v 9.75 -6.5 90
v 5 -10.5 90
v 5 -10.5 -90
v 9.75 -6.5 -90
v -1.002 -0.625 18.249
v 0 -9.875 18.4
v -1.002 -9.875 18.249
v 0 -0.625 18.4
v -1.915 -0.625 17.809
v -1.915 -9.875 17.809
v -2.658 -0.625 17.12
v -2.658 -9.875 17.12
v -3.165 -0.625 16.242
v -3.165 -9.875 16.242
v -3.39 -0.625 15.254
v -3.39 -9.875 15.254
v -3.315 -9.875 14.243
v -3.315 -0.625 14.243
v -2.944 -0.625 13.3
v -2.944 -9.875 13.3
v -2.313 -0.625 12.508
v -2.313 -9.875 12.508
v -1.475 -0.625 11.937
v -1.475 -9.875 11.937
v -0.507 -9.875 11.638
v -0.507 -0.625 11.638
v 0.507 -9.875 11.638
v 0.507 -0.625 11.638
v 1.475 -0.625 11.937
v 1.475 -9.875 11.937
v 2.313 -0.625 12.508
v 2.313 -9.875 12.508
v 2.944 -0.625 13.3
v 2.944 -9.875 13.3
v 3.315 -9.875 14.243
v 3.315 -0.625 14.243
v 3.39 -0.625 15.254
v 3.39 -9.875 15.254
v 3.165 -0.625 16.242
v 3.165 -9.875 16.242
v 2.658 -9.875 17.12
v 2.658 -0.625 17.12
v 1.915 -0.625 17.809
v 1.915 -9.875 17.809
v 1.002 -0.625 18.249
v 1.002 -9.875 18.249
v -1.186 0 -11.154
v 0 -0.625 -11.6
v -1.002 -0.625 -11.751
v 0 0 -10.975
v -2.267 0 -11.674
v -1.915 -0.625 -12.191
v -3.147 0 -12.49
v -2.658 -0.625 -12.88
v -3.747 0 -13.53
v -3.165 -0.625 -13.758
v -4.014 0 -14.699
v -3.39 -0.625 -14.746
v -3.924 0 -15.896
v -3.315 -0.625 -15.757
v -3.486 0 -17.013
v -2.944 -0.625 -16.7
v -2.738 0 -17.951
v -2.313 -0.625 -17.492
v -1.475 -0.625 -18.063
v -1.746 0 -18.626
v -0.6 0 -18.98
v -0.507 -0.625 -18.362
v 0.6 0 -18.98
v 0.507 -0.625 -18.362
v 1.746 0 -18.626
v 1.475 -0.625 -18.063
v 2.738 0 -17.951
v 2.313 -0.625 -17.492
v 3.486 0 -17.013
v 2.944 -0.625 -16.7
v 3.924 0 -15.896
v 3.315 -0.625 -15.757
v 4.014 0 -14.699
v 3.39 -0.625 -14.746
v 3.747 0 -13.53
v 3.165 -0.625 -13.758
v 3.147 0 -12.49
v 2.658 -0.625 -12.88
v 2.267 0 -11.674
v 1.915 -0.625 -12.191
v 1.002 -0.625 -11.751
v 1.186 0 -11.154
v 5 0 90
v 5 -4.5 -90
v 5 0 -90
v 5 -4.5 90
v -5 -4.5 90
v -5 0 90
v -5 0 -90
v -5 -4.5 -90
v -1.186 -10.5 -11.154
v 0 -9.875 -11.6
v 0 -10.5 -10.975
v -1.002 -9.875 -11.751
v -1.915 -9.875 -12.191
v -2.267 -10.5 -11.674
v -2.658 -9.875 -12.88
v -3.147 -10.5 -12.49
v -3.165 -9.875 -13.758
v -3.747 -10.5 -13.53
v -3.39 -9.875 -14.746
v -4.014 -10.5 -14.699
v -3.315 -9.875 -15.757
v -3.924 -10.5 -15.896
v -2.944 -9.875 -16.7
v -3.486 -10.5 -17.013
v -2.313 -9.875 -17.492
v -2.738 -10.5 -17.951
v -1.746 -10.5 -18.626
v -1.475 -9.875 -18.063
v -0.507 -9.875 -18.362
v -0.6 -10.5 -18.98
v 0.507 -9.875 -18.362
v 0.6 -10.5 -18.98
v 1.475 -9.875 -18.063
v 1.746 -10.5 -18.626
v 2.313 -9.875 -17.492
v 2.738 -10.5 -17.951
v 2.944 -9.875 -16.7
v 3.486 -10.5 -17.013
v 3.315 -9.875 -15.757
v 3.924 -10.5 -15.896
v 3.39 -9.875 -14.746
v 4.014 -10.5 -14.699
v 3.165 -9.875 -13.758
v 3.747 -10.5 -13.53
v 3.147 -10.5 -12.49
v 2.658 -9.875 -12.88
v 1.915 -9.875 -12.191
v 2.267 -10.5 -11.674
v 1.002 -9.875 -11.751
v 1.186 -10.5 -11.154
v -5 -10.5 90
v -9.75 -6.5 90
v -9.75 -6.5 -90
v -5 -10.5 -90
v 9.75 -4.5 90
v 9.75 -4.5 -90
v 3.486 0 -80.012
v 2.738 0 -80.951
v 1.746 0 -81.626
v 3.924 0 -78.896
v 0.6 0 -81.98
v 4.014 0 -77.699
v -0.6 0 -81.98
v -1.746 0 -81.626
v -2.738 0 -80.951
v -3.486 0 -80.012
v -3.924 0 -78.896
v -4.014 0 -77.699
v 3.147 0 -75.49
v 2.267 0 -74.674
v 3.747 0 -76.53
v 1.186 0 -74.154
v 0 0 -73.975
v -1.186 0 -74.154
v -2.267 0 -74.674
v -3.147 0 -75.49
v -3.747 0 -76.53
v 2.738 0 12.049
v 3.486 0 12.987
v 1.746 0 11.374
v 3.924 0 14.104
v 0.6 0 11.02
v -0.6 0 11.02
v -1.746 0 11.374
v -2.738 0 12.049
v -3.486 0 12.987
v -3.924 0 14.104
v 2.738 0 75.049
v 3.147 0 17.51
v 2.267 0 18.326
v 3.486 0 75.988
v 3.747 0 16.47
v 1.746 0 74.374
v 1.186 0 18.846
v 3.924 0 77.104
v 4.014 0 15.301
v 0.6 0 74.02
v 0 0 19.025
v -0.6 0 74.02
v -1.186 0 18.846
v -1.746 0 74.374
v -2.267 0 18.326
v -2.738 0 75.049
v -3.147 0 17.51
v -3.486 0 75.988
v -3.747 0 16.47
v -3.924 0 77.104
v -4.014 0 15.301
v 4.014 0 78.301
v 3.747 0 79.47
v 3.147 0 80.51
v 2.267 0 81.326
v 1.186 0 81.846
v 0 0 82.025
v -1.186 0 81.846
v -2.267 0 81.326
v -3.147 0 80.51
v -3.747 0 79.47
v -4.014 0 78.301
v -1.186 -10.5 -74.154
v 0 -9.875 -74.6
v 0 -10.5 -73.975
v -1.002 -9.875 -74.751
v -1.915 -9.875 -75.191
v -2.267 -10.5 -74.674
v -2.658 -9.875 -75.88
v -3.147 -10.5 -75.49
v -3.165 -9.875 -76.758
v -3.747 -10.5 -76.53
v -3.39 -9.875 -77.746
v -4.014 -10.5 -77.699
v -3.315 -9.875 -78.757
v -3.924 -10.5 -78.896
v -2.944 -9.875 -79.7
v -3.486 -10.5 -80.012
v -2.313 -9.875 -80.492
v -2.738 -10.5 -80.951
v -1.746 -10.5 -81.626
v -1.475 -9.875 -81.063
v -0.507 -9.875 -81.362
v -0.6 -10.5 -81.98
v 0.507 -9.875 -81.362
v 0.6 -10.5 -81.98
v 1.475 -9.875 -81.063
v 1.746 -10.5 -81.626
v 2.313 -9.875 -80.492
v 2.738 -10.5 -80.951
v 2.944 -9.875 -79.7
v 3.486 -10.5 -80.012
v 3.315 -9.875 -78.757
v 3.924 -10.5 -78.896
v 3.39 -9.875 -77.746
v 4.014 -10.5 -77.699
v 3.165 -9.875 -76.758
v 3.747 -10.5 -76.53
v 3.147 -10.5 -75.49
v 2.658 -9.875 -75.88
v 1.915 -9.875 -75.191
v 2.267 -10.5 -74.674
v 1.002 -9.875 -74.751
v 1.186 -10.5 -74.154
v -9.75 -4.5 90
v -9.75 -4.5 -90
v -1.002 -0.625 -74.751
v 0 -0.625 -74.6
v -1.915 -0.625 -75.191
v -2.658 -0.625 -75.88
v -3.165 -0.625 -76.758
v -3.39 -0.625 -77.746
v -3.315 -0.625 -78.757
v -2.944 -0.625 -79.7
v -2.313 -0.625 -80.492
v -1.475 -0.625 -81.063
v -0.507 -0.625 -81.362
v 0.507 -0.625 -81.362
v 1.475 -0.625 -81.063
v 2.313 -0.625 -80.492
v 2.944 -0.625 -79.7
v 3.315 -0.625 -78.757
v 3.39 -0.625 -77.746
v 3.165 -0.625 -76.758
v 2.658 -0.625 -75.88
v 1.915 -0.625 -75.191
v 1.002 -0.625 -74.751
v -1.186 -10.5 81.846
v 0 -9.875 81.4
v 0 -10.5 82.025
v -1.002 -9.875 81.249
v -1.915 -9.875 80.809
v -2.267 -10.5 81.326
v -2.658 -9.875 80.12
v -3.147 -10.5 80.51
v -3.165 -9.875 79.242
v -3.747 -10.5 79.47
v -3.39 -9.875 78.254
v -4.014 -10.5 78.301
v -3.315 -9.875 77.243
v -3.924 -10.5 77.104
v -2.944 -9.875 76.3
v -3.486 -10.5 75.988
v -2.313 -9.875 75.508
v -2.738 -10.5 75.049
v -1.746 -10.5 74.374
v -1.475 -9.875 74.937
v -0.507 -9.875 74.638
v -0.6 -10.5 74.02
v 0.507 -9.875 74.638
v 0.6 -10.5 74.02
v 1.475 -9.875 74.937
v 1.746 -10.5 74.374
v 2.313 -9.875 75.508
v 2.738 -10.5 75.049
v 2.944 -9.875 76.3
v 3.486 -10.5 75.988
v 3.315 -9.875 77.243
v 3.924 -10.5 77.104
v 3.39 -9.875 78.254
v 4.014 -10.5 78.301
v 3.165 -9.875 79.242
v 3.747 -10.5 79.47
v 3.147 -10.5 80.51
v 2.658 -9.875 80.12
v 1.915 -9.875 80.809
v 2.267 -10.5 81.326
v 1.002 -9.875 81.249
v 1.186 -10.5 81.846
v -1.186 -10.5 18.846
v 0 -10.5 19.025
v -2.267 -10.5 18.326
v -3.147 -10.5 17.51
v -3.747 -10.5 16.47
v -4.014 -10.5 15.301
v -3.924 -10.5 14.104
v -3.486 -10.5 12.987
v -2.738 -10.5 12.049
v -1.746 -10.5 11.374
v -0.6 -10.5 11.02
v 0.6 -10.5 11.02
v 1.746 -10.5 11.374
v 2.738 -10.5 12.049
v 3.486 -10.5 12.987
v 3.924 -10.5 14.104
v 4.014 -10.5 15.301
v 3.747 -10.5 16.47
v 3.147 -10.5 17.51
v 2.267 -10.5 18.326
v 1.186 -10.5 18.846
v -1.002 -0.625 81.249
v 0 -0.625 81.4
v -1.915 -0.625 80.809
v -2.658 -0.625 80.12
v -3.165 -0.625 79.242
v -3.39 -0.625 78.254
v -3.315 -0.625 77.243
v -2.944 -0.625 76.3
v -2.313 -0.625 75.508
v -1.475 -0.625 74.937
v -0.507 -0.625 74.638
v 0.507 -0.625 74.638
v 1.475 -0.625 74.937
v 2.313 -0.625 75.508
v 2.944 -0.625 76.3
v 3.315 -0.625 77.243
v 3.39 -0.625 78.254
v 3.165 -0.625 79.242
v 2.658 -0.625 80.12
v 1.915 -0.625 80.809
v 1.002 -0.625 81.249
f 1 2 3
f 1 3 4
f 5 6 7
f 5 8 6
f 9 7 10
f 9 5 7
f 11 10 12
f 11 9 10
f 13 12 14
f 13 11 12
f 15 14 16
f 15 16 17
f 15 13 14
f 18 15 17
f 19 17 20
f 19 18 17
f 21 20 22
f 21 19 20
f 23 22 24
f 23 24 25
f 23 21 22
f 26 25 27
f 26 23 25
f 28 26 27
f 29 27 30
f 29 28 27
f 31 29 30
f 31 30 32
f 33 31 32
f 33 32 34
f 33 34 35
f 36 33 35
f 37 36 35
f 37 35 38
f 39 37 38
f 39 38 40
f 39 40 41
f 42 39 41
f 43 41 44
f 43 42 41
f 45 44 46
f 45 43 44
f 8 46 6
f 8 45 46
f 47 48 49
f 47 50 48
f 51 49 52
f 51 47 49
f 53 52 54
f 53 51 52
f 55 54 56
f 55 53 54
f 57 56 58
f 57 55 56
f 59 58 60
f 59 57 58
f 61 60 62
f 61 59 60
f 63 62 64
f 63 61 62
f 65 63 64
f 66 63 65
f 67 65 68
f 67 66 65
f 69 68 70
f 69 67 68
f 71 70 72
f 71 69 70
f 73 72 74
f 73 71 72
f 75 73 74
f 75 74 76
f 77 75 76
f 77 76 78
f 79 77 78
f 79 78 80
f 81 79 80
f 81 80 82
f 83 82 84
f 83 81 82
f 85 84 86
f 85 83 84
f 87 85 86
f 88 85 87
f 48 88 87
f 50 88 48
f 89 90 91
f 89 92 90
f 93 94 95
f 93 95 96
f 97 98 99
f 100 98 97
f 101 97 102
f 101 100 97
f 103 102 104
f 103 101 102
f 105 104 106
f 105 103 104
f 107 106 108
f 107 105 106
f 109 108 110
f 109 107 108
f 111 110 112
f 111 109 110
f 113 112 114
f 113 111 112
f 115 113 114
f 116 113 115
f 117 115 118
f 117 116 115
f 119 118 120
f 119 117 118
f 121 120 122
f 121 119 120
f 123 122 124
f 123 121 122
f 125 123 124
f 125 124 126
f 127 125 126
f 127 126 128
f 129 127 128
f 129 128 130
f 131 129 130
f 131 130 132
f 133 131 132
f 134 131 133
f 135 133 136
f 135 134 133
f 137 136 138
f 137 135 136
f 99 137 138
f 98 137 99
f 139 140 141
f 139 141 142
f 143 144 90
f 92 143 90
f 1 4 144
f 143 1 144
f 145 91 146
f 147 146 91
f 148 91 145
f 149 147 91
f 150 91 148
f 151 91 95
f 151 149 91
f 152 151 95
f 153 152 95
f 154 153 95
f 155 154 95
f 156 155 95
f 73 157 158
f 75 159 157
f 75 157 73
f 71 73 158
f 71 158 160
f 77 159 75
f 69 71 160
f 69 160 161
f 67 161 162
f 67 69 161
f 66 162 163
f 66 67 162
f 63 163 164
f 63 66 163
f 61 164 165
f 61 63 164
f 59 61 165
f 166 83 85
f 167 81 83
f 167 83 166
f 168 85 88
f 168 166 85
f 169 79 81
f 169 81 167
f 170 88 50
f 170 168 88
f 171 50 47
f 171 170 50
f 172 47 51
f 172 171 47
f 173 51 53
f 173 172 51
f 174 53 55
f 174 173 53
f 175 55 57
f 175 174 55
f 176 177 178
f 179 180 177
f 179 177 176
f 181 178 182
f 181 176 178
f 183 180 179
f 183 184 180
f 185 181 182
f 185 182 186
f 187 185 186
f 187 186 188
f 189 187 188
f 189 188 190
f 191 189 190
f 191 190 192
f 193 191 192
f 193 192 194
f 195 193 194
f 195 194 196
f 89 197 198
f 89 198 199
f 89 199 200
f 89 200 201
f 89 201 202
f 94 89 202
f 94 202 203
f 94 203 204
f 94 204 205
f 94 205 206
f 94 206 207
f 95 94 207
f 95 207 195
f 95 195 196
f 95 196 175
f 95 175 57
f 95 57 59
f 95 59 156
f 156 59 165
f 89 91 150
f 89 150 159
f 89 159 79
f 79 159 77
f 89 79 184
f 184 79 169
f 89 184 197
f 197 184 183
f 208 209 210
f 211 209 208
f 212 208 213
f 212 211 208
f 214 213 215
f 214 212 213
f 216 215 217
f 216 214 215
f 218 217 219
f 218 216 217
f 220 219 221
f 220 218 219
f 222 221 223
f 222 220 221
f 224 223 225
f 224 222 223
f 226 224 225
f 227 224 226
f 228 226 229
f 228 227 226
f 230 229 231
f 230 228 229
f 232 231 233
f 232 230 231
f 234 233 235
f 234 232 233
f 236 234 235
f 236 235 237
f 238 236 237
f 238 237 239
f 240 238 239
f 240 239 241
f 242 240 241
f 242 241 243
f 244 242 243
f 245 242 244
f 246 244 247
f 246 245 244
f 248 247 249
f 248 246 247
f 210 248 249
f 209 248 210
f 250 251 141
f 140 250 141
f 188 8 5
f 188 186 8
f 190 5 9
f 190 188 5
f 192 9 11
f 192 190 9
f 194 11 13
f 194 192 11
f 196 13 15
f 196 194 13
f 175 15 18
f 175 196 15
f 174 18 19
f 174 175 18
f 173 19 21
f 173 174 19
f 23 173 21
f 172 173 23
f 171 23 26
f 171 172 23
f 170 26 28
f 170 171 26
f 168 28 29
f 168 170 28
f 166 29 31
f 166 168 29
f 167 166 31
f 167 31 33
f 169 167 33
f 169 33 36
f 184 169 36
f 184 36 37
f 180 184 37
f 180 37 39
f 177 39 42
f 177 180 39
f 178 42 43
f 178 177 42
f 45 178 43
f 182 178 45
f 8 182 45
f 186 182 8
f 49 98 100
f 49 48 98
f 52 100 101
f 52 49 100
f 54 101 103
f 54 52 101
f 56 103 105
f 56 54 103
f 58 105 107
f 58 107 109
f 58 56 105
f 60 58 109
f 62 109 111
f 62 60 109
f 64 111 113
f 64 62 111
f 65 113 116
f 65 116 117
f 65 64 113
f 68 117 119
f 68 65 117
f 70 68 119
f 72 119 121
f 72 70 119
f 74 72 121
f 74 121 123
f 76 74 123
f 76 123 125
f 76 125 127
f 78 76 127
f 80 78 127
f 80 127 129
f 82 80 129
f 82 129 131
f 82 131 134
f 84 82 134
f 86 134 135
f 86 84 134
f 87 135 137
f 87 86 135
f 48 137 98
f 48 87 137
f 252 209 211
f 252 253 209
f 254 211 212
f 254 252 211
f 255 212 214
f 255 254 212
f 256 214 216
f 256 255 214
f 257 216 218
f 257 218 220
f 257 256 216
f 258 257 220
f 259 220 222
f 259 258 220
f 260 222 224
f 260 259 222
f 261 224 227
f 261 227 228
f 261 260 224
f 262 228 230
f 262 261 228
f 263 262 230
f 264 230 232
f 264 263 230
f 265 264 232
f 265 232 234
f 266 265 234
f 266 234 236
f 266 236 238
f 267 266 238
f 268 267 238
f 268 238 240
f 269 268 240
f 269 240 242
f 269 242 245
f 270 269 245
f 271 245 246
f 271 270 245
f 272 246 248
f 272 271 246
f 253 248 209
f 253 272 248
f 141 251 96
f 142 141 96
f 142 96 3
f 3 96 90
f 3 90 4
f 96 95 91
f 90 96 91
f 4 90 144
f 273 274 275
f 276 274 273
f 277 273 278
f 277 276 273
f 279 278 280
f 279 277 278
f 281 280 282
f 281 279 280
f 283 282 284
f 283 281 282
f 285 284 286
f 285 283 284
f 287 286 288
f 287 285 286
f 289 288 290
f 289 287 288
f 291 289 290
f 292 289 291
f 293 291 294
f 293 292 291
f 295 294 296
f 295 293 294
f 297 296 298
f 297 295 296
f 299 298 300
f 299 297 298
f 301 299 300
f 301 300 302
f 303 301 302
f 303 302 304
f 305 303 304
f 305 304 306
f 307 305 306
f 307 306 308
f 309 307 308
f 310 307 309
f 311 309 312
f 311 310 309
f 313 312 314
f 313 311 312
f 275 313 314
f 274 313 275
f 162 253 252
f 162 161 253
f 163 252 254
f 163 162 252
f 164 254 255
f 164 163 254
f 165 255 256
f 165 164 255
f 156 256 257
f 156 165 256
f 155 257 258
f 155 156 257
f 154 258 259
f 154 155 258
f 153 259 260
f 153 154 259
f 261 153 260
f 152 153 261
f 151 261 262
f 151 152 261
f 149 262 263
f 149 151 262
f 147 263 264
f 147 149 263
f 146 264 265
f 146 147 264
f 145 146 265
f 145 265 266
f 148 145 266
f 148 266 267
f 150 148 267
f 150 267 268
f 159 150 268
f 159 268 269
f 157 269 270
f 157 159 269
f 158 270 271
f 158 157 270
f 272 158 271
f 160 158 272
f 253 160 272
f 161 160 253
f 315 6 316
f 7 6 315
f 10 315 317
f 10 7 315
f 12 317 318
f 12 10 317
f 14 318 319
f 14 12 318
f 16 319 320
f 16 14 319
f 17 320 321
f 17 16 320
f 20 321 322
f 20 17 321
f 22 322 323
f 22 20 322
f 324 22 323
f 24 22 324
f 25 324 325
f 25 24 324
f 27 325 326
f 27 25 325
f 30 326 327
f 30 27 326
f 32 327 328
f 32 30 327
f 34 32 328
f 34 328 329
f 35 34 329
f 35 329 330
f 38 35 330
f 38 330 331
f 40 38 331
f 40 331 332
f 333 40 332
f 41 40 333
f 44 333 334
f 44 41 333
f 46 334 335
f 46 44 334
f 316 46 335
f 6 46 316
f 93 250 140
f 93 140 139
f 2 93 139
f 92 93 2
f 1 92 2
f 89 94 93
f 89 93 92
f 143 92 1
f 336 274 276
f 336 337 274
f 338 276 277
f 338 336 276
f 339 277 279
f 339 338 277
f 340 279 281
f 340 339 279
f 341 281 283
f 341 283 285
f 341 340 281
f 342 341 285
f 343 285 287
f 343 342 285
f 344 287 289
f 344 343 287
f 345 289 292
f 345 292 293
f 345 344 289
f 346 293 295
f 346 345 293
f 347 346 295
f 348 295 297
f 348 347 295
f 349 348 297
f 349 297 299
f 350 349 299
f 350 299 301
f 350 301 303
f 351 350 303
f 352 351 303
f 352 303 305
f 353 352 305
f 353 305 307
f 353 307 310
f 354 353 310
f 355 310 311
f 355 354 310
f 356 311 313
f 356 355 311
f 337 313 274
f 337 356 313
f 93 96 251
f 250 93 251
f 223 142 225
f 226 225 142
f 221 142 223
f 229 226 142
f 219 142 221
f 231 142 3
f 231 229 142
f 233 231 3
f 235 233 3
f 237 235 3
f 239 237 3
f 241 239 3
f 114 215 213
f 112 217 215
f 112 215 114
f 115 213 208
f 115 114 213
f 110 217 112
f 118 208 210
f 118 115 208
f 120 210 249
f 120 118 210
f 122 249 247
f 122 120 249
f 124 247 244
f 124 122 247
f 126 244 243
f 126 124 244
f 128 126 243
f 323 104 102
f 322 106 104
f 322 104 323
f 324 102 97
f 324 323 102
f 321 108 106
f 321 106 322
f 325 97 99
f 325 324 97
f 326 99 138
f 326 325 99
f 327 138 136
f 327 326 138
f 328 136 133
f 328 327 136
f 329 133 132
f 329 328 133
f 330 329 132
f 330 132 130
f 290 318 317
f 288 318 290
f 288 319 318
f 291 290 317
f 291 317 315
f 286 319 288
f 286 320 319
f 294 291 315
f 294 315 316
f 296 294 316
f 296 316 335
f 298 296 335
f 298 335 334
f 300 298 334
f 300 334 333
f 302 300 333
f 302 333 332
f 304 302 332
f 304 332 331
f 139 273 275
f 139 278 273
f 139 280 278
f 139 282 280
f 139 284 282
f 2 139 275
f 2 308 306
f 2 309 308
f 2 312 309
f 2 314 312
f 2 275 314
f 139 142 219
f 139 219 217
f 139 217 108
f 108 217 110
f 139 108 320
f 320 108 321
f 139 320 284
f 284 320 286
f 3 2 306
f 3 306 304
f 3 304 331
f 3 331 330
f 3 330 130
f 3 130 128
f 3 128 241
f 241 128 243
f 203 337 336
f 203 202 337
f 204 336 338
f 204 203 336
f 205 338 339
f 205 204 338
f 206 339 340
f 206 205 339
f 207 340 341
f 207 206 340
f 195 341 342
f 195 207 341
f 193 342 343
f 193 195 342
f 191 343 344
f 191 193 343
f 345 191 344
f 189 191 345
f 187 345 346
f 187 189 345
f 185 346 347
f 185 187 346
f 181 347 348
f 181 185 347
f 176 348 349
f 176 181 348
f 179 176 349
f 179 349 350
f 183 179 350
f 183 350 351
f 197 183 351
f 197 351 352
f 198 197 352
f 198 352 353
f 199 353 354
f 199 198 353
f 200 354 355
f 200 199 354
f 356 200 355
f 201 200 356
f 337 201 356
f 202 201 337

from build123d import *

# Parameters (mm, degrees)
EXTRUDE_1_DEPTH            = 90
HOLE_WIZARD_M81_AT_2_COUNT = 2
HOLE_WIZARD_M81_AT_2_PITCH = 63
HOLE_WIZARD_M81_AT_3_COUNT = 2
HOLE_WIZARD_M81_AT_3_PITCH = 93
HOLE_WIZARD_M81_AT_4_COUNT = 2
HOLE_WIZARD_M81_AT_4_PITCH = 156


with BuildPart() as part:
    # Эскиз1 → Бобышка-Вытянуть1 (new body, symmetric)
    with BuildSketch(Plane.XY):
        Polygon((5, 0), (-5, 0), (-5, -4.5), (-9.75, -4.5), (-9.75, -6.5), (-5, -10.5), (5, -10.5), (9.75, -6.5), (9.75, -4.5), (5, -4.5), align=None)
    extrude(amount=EXTRUDE_1_DEPTH, both=True)

    # Эскиз8 → Отверстие обработанное метчиком M81 (revolve, cut)
    with BuildSketch(Plane(origin=(0, 0, -78), x_dir=(0, 0, 1), z_dir=(1, 0, 0))):
        Polygon((0, 0), (0, 10.5), (4.025, 10.5), (3.4, 9.875), (3.4, 0.625), (4.025, 0), align=None)
    hole_wizard_m81 = revolve(axis=Axis((0, 6.35, -78), (0, -1, 0)), mode=Mode.SUBTRACT)

    # Отверстие обработанное метчиком M81 at 2: Отверстие обработанное метчиком M81 ×2
    with Locations(*[(0, 0, i * HOLE_WIZARD_M81_AT_2_PITCH) for i in range(1, HOLE_WIZARD_M81_AT_2_COUNT)]):
        add(hole_wizard_m81, mode=Mode.SUBTRACT)

    # Отверстие обработанное метчиком M81 at 3: Отверстие обработанное метчиком M81 ×2
    with Locations(*[(0, 0, i * HOLE_WIZARD_M81_AT_3_PITCH) for i in range(1, HOLE_WIZARD_M81_AT_3_COUNT)]):
        add(hole_wizard_m81, mode=Mode.SUBTRACT)

    # Отверстие обработанное метчиком M81 at 4: Отверстие обработанное метчиком M81 ×2
    with Locations(*[(0, 0, i * HOLE_WIZARD_M81_AT_4_PITCH) for i in range(1, HOLE_WIZARD_M81_AT_4_COUNT)]):
        add(hole_wizard_m81, mode=Mode.SUBTRACT)


solid = part.part
